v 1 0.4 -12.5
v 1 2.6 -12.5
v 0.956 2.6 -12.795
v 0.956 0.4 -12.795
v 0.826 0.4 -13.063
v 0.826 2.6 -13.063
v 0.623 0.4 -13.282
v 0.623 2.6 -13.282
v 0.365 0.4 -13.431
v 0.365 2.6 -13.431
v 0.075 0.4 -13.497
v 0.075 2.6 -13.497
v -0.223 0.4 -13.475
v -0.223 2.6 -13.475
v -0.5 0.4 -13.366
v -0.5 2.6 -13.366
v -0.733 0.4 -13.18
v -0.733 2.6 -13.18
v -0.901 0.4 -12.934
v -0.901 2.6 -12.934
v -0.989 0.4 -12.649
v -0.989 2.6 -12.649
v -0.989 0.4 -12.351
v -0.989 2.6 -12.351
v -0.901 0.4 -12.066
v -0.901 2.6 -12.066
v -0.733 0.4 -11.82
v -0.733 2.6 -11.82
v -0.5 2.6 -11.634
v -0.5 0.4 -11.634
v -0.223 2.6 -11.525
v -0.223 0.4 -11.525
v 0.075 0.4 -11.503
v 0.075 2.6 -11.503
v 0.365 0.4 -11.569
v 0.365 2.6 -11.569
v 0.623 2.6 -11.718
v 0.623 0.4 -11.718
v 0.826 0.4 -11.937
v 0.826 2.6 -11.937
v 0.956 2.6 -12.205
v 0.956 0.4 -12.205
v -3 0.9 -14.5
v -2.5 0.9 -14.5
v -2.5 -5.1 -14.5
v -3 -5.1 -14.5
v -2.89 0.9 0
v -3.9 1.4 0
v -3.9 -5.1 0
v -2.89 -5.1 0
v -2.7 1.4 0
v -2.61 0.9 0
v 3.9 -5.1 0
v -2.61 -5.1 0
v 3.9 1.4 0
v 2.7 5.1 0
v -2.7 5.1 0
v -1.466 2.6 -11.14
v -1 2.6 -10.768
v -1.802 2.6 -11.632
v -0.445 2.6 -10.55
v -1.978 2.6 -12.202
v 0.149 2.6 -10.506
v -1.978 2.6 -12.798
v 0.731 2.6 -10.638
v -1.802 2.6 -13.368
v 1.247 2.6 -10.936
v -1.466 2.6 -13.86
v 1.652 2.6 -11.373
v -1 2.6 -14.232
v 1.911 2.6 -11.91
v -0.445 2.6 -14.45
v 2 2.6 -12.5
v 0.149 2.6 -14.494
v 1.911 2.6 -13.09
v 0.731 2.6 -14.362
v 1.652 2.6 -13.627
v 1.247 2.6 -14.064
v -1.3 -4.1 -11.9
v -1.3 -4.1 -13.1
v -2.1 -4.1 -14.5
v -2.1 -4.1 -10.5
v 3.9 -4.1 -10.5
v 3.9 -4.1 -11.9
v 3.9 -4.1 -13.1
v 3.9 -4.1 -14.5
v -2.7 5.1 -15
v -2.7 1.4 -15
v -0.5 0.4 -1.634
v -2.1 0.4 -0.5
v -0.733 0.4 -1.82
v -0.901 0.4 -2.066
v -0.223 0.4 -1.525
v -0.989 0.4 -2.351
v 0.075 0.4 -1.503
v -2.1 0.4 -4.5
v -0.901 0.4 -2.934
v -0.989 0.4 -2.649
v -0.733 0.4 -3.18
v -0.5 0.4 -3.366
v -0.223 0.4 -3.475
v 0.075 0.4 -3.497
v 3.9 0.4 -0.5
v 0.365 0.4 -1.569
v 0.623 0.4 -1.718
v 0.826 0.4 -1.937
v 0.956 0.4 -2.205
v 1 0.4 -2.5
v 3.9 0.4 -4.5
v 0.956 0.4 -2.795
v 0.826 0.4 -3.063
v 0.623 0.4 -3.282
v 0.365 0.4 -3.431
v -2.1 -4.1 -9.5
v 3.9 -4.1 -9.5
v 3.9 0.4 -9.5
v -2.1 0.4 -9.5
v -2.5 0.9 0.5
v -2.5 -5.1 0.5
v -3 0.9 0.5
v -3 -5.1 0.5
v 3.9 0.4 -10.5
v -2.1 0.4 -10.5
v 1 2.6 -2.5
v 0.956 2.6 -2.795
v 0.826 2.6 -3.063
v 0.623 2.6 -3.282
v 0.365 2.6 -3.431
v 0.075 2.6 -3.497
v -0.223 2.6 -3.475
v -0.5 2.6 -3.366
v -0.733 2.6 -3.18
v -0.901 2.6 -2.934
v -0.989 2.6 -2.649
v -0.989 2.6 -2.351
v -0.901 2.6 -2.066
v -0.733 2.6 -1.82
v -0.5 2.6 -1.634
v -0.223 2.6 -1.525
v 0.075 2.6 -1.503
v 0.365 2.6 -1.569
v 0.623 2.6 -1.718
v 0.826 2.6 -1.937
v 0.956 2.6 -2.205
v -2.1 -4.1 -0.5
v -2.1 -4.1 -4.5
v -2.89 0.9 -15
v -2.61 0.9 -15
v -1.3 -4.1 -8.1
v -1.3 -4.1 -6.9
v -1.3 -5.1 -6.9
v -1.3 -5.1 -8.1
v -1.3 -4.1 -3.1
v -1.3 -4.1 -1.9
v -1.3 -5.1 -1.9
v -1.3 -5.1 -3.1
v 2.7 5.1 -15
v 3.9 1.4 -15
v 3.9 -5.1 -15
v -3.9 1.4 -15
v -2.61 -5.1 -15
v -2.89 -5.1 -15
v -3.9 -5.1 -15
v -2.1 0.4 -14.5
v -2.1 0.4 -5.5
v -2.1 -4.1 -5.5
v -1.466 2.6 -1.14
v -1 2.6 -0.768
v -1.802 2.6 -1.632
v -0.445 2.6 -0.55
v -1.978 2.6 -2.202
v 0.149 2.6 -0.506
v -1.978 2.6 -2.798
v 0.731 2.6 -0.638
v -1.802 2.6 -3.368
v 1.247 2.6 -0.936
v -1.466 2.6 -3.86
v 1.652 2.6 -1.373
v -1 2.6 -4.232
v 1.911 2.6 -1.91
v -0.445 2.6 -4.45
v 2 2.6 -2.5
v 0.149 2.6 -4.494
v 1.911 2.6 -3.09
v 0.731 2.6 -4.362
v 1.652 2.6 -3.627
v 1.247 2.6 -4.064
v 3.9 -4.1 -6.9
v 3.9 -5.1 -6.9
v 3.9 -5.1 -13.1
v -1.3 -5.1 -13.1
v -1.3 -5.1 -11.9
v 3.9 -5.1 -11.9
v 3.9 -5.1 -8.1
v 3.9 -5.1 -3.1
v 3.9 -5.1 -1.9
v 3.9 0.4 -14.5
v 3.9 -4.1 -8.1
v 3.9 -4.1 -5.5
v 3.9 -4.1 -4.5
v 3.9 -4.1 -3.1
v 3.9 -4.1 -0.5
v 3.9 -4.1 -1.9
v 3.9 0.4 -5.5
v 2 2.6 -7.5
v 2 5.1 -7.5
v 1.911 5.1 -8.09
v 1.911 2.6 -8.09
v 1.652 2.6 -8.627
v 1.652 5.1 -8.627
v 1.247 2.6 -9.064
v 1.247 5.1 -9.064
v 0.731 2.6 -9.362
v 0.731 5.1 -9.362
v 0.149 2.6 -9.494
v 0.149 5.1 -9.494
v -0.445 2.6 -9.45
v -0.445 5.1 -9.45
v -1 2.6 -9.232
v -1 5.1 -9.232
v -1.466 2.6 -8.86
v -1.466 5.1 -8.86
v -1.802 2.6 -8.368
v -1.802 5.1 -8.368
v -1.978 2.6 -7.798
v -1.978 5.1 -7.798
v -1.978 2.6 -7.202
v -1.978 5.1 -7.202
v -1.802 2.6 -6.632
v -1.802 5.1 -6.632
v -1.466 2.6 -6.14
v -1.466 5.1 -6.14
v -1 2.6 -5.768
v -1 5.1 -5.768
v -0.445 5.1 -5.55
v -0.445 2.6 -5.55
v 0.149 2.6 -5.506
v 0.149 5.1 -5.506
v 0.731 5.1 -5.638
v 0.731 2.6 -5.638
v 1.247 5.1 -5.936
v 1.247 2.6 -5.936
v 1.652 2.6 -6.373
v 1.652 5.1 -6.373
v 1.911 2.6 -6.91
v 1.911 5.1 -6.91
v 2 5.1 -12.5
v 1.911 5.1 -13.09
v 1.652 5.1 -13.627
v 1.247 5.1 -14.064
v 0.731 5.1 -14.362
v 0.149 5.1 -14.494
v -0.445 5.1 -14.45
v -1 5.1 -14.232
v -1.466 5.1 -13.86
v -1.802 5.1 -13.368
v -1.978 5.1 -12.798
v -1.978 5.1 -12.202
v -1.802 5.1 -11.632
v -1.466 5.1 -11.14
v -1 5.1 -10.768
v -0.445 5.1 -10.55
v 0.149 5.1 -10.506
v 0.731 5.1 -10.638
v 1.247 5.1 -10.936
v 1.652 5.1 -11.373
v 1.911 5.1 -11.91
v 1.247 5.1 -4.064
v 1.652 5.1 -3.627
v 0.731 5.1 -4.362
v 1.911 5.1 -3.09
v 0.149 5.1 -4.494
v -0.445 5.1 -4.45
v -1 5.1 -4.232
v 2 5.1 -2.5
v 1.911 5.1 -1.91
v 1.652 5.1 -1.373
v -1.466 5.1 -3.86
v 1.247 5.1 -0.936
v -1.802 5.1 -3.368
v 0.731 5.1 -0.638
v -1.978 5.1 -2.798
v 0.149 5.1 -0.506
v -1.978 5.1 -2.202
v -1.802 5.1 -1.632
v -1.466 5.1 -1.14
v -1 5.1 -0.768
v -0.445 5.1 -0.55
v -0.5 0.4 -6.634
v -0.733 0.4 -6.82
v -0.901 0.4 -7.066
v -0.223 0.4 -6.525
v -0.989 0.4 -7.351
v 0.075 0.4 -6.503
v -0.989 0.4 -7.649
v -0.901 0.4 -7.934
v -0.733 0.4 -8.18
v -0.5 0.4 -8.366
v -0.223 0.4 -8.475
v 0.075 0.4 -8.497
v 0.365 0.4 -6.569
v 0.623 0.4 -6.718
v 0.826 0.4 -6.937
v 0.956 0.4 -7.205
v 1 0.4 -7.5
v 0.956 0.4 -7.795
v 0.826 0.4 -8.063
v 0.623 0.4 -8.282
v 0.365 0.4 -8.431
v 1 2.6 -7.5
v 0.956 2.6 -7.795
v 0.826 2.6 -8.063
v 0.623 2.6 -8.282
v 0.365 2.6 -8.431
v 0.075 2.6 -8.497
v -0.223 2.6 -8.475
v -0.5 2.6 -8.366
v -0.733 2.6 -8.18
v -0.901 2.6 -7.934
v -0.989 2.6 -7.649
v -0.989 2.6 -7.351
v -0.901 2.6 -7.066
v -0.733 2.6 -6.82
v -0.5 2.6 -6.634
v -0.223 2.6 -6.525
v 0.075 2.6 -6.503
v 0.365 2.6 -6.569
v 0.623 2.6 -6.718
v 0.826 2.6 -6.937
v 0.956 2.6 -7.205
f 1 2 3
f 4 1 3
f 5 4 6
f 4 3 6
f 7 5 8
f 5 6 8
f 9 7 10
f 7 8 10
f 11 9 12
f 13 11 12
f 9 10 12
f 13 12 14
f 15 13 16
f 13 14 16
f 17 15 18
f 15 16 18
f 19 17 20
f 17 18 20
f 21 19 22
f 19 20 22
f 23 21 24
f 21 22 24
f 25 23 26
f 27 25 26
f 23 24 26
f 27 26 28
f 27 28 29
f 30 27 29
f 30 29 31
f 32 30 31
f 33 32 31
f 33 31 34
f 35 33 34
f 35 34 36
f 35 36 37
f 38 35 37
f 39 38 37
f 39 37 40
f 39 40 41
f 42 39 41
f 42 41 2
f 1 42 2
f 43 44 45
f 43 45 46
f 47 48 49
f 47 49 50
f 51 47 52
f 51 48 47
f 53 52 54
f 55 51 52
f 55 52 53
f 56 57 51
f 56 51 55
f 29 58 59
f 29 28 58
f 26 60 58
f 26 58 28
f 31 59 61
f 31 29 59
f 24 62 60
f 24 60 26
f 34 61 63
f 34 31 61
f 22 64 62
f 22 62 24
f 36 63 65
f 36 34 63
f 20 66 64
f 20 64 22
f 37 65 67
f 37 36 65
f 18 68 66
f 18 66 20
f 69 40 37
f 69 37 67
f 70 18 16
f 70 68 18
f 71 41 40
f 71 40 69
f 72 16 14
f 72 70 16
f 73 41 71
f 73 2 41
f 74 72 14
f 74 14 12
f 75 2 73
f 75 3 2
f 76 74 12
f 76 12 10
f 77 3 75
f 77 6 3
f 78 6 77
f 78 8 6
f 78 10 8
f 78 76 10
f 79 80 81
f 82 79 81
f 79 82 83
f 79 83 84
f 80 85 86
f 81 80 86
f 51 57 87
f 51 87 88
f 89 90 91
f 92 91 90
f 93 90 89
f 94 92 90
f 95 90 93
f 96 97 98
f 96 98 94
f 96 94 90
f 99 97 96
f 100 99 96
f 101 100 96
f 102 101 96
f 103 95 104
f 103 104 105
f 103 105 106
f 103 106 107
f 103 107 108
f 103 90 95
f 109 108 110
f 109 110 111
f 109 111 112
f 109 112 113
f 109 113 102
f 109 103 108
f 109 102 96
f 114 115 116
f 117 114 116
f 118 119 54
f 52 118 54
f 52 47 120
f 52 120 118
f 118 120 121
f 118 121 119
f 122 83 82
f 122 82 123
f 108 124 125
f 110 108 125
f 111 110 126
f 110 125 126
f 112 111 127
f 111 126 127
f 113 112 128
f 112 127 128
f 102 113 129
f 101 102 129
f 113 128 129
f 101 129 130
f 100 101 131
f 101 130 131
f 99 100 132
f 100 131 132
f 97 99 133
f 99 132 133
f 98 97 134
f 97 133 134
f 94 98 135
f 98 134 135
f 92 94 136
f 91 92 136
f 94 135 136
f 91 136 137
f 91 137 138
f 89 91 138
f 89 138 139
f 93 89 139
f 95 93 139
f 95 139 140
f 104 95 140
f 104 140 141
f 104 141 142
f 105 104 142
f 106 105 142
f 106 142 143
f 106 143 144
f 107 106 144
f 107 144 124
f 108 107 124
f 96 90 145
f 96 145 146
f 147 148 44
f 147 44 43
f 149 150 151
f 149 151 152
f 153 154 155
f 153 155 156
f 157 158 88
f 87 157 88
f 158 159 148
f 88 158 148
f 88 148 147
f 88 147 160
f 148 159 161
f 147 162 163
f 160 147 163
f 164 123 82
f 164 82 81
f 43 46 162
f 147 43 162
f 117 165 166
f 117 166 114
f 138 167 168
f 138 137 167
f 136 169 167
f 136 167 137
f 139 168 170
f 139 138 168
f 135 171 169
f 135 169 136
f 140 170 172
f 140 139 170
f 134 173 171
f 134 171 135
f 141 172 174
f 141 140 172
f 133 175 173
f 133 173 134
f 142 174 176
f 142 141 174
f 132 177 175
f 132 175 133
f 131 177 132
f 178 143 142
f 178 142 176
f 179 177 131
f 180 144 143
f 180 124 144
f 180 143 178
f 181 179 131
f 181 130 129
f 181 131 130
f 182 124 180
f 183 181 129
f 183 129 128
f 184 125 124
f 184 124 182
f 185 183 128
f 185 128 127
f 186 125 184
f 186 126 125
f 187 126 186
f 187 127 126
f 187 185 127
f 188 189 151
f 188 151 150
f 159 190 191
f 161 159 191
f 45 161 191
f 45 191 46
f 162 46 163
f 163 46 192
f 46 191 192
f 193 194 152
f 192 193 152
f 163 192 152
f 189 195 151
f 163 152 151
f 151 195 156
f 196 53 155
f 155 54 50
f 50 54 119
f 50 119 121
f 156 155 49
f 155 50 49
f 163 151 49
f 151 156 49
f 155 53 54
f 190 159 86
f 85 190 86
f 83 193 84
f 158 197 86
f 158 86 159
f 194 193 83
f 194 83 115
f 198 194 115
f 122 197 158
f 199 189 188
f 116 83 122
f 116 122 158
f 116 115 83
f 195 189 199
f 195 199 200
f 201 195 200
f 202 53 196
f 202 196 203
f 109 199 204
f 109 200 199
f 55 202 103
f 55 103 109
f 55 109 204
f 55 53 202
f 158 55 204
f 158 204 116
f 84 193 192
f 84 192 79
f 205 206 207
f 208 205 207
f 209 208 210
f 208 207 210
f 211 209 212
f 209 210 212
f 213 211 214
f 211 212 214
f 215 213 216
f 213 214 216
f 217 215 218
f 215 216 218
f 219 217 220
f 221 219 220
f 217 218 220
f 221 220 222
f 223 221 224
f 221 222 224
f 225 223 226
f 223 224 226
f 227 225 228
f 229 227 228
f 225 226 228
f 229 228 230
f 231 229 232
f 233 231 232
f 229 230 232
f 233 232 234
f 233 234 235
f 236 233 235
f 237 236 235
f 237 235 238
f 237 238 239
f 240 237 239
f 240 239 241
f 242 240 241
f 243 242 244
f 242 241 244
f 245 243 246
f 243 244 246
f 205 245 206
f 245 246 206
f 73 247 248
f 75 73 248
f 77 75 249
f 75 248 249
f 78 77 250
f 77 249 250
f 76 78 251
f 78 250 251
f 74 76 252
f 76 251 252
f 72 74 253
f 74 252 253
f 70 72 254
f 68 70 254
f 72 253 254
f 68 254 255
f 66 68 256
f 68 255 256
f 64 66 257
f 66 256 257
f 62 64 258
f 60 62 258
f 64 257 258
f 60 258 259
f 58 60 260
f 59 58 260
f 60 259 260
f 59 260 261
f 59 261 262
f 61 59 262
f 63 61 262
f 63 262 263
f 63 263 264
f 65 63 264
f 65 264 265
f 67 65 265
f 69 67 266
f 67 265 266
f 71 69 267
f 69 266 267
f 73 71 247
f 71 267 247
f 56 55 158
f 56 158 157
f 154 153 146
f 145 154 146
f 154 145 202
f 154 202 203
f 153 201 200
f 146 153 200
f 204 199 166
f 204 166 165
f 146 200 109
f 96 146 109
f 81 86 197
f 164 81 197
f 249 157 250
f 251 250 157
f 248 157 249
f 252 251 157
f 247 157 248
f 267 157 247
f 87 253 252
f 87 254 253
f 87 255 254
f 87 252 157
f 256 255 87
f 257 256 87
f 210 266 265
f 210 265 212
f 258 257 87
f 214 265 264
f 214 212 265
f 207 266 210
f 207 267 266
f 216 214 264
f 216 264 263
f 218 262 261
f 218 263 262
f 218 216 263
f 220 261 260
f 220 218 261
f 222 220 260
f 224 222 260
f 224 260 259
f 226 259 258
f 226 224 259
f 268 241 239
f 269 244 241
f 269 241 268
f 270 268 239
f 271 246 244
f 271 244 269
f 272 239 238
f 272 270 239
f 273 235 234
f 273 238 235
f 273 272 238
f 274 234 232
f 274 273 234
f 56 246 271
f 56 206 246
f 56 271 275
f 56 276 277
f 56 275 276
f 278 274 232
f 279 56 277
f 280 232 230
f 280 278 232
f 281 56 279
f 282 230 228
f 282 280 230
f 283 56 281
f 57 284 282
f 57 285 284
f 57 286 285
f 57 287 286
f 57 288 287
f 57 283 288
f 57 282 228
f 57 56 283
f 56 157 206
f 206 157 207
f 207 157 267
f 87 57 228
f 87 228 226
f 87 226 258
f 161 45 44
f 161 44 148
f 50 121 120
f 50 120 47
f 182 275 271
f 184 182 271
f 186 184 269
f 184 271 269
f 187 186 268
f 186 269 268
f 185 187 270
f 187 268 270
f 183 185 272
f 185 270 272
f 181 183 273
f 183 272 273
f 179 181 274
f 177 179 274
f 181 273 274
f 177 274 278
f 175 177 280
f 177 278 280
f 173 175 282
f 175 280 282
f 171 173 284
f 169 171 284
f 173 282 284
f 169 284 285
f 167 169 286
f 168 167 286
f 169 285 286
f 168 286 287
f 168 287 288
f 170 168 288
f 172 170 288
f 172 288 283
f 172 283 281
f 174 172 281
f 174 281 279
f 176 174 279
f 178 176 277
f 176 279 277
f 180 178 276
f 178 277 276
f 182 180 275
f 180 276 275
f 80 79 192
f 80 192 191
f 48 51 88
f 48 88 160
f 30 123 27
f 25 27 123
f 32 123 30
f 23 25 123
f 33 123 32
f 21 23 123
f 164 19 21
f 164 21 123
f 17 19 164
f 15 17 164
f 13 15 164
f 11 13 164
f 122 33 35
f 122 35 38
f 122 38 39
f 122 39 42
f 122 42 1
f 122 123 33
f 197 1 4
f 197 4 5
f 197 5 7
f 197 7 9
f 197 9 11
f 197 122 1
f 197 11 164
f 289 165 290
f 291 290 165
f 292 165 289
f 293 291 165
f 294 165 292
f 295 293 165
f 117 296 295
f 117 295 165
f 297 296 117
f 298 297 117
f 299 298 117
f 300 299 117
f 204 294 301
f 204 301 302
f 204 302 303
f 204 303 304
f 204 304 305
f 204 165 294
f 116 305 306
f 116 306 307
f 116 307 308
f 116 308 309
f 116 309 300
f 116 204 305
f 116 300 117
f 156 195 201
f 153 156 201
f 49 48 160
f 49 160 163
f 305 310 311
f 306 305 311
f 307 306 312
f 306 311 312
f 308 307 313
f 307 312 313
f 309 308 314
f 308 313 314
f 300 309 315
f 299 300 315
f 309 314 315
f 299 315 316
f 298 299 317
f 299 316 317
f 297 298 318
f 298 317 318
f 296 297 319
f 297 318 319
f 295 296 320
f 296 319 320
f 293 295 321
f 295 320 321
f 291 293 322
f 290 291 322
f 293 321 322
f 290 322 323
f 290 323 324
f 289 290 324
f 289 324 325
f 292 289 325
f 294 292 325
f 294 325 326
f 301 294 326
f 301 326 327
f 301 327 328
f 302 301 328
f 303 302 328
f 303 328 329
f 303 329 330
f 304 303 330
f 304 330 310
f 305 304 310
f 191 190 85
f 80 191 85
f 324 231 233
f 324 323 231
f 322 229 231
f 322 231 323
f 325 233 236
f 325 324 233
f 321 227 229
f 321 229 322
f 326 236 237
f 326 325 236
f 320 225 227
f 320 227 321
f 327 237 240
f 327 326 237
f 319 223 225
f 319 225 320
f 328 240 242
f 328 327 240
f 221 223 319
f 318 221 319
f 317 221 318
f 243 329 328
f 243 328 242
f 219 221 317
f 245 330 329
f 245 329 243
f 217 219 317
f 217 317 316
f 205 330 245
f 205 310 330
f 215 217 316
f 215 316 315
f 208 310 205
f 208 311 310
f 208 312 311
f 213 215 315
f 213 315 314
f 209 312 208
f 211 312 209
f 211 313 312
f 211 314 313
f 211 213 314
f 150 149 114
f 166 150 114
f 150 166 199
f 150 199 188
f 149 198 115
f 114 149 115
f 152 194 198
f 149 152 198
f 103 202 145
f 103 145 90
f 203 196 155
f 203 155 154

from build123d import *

# Parameters (mm, degrees)
BOSS_EXTRUDE1_DEPTH = 15
SKETCH3_R           = 2
CUT_EXTRUDE2_DEPTH  = 2.5
SKETCH4_R           = 1
CUT_EXTRUDE3_DEPTH  = 3
SKETCH2_W           = 4
SKETCH2_H           = 4.5
CUT_EXTRUDE1_DEPTH  = 6
SKETCH5_W           = 1.2
SKETCH5_H           = 2
CUT_EXTRUDE4_DEPTH  = 5.2
SKETCH6_W           = 0.5
SKETCH6_H           = 6
BOSS_EXTRUDE2_DEPTH = 0.5
SKETCH7_W           = 0.5
SKETCH7_H           = 6
CUT_EXTRUDE5_DEPTH  = 0.5
LPATTERN1_COUNT     = 3
LPATTERN1_PITCH     = 5
CUT_EXTRUDE6_DEPTH  = 10
BOSS_EXTRUDE3_DEPTH = 6


with BuildPart() as part:
    # Sketch1 → Boss-Extrude1 (new body)
    with BuildSketch(Plane.XY):
        Polygon((2.7, 5.1), (-2.7, 5.1), (-2.7, 1.4), (-3.9, 1.4), (-3.9, -5.1), (3.9, -5.1), (3.9, 1.4), align=None)
    extrude(amount=-BOSS_EXTRUDE1_DEPTH)

    # Sketch3 → Cut-Extrude2 (cut)
    with BuildSketch(Plane(origin=(0, 5.1, 0), x_dir=(1, 0, 0), z_dir=(0, 1, 0))):
        with Locations((0, 2.5)):
            Circle(SKETCH3_R)
        with Locations((0, 7.5)):
            Circle(SKETCH3_R)
        with Locations((0, 12.5)):
            Circle(SKETCH3_R)
    extrude(amount=-CUT_EXTRUDE2_DEPTH, mode=Mode.SUBTRACT)

    # Sketch4 → Cut-Extrude3 (cut)
    with BuildSketch(Plane(origin=(0, 2.6, 0), x_dir=(1, 0, 0), z_dir=(0, 1, 0))):
        with Locations((0, 2.5)):
            Circle(SKETCH4_R)
        with Locations((0, 7.5)):
            Circle(SKETCH4_R)
        with Locations((0, 12.5)):
            Circle(SKETCH4_R)
    extrude(amount=-CUT_EXTRUDE3_DEPTH, mode=Mode.SUBTRACT)

    # Sketch2 → Cut-Extrude1 (cut)
    with BuildSketch(Plane(origin=(3.9, 0, 0), x_dir=(0, 0, -1), z_dir=(1, 0, 0))):
        with Locations((2.5, -1.85)):
            Rectangle(SKETCH2_W, SKETCH2_H)
    cut_extrude1 = extrude(amount=-CUT_EXTRUDE1_DEPTH, mode=Mode.SUBTRACT)

    # Sketch5 → Cut-Extrude4 (cut)
    with BuildSketch(Plane(origin=(3.9, 0, 0), x_dir=(0, 0, -1), z_dir=(1, 0, 0))):
        with Locations((2.5, -5.1)):
            Rectangle(SKETCH5_W, SKETCH5_H)
    cut_extrude4 = extrude(amount=-CUT_EXTRUDE4_DEPTH, mode=Mode.SUBTRACT)

    # Sketch6 → Boss-Extrude2 (add)
    with BuildSketch(Plane.XY):
        with Locations((-2.75, -2.1)):
            Rectangle(SKETCH6_W, SKETCH6_H)
    extrude(amount=BOSS_EXTRUDE2_DEPTH)

    # Sketch7 → Cut-Extrude5 (cut)
    with BuildSketch(Plane(origin=(0, 0, -15), x_dir=(-1, 0, 0), z_dir=(0, 0, -1))):
        with Locations((2.75, -2.1)):
            Rectangle(SKETCH7_W, SKETCH7_H)
    extrude(amount=-CUT_EXTRUDE5_DEPTH, mode=Mode.SUBTRACT)

    # LPattern1: Cut-Extrude1, Cut-Extrude4 ×3
    with Locations(*[(0, 0, -i * LPATTERN1_PITCH) for i in range(1, LPATTERN1_COUNT)]):
        add(cut_extrude1, mode=Mode.SUBTRACT)
        add(cut_extrude4, mode=Mode.SUBTRACT)

    # Sketch8 → Cut-Extrude6 (cut)
    with BuildSketch(Plane(origin=(0, 0.9, 0), x_dir=(1, 0, 0), z_dir=(0, 1, 0))):
        Polygon((-3, -0.5), (-2.89, 0), (-3, 0), align=None)
        Polygon((-2.5, -0.5), (-2.61, 0), (-2.5, 0), align=None)
    extrude(amount=-CUT_EXTRUDE6_DEPTH, mode=Mode.SUBTRACT)

    # Sketch9 → Boss-Extrude3 (add)
    with BuildSketch(Plane.XZ.offset(5.1)):
        Polygon((-3, -14.5), (-2.89, -15), (-3, -15), align=None)
        Polygon((-2.5, -14.5), (-2.61, -15), (-2.5, -15), align=None)
    extrude(amount=-BOSS_EXTRUDE3_DEPTH)


solid = part.part
